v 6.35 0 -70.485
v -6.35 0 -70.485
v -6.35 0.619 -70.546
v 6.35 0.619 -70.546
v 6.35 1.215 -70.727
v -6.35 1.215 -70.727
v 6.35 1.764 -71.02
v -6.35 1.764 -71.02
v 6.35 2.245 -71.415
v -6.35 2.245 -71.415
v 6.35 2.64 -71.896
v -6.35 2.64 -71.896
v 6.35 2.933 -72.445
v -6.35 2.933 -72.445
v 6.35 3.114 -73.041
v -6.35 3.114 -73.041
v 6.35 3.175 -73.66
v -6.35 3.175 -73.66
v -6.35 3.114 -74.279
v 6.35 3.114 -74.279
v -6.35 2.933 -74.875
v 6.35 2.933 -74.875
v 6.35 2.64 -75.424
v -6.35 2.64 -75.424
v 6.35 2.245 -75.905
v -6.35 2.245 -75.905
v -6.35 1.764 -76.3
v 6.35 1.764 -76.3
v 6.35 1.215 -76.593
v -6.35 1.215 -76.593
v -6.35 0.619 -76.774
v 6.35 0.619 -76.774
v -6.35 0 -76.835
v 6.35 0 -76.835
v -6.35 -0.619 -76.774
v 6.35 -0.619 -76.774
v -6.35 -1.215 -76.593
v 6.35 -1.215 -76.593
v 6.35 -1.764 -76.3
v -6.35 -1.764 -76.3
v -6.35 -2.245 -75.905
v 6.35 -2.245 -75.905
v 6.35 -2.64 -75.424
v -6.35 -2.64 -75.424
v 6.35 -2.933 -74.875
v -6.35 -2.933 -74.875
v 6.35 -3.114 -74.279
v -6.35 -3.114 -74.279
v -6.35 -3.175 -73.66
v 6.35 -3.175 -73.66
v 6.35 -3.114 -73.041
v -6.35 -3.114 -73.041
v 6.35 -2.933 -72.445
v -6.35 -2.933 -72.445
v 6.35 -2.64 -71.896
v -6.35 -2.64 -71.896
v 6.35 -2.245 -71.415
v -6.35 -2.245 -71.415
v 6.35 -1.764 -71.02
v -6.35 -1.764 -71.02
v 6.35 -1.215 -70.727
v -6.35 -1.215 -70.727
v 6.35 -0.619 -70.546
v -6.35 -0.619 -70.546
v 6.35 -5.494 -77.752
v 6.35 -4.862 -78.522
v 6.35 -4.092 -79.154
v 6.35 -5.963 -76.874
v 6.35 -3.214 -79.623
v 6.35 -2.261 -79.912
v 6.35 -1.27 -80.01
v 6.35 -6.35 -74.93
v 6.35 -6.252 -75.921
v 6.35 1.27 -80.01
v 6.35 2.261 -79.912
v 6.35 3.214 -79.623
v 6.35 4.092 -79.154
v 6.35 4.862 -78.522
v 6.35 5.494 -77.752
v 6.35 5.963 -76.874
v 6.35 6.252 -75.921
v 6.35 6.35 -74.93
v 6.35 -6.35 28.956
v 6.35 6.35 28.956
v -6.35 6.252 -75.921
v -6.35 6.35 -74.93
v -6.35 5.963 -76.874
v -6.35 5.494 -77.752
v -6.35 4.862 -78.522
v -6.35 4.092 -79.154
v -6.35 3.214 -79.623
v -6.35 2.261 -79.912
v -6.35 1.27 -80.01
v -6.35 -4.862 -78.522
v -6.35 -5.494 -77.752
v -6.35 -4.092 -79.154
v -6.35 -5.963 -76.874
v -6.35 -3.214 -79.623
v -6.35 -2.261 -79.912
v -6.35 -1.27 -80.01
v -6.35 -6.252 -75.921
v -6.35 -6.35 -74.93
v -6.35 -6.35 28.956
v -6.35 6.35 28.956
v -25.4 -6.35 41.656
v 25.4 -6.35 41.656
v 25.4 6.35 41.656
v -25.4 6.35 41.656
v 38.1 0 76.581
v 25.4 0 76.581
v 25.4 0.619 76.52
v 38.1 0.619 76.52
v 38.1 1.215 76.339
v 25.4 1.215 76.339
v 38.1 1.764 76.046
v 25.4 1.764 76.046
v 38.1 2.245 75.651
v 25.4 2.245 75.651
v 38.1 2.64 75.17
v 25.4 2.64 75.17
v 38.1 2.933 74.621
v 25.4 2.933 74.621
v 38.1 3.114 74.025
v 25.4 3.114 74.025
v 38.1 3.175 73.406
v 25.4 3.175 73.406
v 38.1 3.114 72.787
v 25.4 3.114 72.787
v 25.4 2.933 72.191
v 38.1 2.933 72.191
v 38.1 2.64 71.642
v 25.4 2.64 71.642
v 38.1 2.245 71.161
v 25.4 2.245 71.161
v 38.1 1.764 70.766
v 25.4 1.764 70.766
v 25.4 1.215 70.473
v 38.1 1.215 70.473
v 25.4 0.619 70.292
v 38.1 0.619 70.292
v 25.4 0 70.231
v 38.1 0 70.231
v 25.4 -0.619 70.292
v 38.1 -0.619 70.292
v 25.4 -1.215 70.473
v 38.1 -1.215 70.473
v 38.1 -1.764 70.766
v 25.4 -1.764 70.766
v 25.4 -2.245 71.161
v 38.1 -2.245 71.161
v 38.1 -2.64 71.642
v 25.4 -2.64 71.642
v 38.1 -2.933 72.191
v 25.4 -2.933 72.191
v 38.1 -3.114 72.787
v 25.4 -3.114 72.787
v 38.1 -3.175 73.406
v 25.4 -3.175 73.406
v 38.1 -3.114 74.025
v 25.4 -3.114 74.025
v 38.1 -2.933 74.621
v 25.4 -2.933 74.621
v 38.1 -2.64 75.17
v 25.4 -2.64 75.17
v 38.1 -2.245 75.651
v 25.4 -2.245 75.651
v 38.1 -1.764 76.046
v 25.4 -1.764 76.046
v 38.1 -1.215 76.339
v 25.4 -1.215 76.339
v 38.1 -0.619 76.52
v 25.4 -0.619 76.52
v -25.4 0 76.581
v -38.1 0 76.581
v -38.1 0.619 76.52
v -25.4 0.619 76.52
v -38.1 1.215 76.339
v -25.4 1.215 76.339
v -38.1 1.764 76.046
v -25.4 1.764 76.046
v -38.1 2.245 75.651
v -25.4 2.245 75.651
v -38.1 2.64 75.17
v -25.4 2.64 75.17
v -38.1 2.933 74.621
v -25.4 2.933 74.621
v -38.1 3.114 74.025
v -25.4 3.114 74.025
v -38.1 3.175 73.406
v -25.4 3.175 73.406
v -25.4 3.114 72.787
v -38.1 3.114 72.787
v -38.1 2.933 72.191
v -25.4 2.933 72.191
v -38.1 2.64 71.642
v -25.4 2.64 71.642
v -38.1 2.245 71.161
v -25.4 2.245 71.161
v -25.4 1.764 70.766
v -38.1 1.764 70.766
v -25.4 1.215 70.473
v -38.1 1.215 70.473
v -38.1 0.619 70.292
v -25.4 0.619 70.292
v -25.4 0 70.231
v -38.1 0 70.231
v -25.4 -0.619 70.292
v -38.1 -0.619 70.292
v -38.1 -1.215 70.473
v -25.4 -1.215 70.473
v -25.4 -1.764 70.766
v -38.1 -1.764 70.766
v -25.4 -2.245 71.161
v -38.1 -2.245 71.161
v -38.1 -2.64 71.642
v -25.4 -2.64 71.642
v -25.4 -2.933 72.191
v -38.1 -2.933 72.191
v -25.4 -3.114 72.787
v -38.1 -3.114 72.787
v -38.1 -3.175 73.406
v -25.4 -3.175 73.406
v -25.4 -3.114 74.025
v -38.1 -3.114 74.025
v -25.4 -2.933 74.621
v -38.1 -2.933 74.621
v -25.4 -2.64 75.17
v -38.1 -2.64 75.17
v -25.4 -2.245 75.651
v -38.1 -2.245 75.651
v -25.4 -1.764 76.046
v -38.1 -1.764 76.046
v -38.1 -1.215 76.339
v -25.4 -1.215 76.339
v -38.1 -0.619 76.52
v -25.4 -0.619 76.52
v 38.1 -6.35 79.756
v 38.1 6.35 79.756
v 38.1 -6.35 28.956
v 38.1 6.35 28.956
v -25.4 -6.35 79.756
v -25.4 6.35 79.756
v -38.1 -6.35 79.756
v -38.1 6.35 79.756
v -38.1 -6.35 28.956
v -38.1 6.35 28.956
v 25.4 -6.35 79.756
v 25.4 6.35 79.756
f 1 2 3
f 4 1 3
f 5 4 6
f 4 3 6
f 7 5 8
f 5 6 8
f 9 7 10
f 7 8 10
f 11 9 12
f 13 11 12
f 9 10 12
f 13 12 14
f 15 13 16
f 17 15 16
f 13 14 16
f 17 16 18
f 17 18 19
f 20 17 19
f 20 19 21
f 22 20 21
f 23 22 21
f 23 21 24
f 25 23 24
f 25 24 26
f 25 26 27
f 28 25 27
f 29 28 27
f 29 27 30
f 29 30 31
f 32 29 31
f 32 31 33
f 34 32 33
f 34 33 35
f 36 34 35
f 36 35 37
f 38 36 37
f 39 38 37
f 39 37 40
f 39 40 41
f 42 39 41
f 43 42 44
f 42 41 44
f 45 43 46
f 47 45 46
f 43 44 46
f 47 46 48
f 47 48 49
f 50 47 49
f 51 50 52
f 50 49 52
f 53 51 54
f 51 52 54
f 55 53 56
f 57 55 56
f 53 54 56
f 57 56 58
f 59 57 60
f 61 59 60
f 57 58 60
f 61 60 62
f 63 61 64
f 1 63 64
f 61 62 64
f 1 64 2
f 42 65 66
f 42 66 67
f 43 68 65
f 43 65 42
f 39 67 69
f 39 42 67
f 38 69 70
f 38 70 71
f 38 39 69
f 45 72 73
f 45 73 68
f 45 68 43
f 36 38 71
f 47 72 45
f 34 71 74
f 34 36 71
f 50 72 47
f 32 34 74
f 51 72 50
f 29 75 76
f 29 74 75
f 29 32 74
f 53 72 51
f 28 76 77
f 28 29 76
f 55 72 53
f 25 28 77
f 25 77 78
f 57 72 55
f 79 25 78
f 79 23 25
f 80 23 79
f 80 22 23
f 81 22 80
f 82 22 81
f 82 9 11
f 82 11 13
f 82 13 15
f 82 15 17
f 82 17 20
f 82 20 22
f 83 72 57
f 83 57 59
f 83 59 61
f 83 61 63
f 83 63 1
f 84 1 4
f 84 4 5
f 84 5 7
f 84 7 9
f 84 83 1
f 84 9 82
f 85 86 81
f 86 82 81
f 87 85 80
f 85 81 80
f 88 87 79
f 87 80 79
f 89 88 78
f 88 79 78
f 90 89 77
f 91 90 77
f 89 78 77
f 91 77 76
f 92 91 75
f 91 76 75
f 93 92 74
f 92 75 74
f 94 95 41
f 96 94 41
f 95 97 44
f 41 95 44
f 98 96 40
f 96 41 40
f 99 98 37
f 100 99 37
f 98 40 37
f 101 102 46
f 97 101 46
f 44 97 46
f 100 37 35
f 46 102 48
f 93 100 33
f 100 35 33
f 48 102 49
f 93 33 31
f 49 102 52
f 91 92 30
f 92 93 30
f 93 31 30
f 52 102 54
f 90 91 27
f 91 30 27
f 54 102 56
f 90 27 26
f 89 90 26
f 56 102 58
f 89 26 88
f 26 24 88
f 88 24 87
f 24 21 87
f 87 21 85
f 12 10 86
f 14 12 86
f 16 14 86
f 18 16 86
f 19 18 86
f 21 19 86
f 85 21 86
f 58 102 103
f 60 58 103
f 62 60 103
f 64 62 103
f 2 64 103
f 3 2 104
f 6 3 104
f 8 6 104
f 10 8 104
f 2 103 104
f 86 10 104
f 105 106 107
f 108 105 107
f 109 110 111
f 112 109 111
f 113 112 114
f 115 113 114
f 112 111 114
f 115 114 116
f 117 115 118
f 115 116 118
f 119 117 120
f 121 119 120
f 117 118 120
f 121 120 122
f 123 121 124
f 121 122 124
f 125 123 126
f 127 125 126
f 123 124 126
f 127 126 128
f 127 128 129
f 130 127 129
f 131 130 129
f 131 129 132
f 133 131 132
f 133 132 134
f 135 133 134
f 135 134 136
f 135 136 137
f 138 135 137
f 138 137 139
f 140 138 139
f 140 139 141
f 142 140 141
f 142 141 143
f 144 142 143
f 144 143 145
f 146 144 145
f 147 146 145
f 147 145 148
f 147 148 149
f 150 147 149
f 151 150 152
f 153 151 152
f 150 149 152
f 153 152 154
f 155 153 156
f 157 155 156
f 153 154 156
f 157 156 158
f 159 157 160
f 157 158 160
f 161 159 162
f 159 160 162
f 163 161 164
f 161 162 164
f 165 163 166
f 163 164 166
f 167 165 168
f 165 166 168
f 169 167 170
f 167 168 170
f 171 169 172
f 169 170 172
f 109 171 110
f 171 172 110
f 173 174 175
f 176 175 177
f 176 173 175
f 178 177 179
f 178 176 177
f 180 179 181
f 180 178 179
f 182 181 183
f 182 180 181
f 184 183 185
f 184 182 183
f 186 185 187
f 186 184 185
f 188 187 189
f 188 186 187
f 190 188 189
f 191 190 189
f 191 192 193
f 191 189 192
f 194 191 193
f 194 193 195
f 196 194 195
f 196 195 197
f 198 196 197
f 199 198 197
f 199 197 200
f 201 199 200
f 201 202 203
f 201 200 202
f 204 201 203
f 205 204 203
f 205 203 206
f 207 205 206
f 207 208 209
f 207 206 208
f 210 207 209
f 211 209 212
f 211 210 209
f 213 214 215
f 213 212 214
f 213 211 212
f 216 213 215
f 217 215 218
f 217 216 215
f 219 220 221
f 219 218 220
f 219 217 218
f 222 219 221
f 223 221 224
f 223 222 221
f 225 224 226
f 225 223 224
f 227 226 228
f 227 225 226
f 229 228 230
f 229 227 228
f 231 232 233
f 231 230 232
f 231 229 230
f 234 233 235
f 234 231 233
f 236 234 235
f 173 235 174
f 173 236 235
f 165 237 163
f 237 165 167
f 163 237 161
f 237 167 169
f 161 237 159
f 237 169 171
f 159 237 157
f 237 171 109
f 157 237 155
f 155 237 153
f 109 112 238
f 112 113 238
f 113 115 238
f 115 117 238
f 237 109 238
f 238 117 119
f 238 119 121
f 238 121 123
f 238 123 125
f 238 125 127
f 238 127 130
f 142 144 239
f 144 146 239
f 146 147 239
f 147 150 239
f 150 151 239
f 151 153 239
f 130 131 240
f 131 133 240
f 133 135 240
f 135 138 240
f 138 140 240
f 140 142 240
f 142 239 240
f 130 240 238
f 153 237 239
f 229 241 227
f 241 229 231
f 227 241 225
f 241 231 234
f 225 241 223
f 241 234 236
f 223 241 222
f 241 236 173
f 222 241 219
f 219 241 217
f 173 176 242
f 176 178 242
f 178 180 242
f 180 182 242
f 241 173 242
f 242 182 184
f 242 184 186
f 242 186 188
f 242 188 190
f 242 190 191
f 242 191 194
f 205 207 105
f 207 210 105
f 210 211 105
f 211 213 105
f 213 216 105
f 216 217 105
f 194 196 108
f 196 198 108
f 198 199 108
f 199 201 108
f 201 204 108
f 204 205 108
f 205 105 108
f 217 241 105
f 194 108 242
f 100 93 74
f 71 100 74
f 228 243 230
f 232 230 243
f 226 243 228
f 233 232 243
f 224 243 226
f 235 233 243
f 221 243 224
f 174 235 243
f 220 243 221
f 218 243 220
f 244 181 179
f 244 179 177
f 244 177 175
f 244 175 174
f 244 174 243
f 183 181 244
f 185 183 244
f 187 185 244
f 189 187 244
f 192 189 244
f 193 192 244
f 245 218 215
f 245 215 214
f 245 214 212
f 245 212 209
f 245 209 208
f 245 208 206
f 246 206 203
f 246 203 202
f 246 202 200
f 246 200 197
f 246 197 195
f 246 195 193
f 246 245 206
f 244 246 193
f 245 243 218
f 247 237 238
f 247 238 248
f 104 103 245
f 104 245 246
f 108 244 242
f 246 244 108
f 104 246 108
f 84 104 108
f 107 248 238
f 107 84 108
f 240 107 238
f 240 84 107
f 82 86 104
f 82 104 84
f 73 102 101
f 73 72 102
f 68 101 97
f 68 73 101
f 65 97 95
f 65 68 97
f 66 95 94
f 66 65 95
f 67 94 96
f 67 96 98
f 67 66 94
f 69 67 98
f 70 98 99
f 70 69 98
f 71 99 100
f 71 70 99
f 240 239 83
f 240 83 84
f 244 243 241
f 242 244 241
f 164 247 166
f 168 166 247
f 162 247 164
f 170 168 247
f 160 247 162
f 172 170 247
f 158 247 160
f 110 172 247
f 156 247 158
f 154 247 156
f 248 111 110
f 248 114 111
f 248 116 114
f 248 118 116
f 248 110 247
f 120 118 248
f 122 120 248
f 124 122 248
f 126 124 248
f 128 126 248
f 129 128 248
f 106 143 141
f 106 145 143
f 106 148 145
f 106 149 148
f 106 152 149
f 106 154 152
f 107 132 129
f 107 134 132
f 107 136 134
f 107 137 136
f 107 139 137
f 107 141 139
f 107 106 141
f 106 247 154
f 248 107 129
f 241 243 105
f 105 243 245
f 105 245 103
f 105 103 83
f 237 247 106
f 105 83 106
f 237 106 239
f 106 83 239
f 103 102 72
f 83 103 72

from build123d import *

# Parameters (mm, degrees)
SKETCH1_W                = 12.7
SKETCH1_H                = 12.7
BOSS_EXTRUDE1_DEPTH      = 41.656
BOSS_EXTRUDE1_DEPTH_BACK = 80.01
SKETCH4_W                = 12.7
SKETCH4_H                = 12.7
BOSS_EXTRUDE2_DEPTH      = 38.1
SKETCH5_W                = 12.7
SKETCH5_H                = 12.7
BOSS_EXTRUDE3_DEPTH      = 50.8
SKETCH6_R                = 3.175
CUT_EXTRUDE1_DEPTH       = 16.51
SKETCH7_R                = 3.175
CUT_EXTRUDE2_DEPTH       = 45.45
FILLET1_R                = 5.08


with BuildPart() as part:
    # Sketch1 → Boss-Extrude1 (new body, two sides)
    with BuildSketch(Plane.XY) as boss_extrude1_sk:
        Rectangle(SKETCH1_W, SKETCH1_H)
    extrude(amount=BOSS_EXTRUDE1_DEPTH)
    extrude(boss_extrude1_sk.sketch, amount=-BOSS_EXTRUDE1_DEPTH_BACK)

    # Sketch4 → Boss-Extrude2 (add, symmetric)
    with BuildSketch(Plane(origin=(0, 0, 0), x_dir=(0, 0, -1), z_dir=(1, 0, 0))):
        with Locations((-35.306, 0)):
            Rectangle(SKETCH4_W, SKETCH4_H)
    extrude(amount=BOSS_EXTRUDE2_DEPTH, both=True)

    # Sketch5 → Boss-Extrude3 (add)
    with BuildSketch(Plane(origin=(0, 0, 28.956), x_dir=(-1, 0, 0), z_dir=(0, 0, -1))):
        with Locations((-31.75, 0)):
            Rectangle(SKETCH5_W, SKETCH5_H)
    boss_extrude3 = extrude(amount=-BOSS_EXTRUDE3_DEPTH)

    # Sketch6 → Cut-Extrude1 (cut)
    with BuildSketch(Plane.ZY.offset(-25.4)):
        with Locations((73.406, 0)):
            Circle(SKETCH6_R)
    cut_extrude1 = extrude(amount=-CUT_EXTRUDE1_DEPTH, mode=Mode.SUBTRACT)

    # Mirror1: Boss-Extrude3, Cut-Extrude1 across plane
    add(boss_extrude3.mirror(Plane(origin=(0, 0, 0), x_dir=(0, 0, 1), z_dir=(1, 0, 0))))
    add(cut_extrude1.mirror(Plane(origin=(0, 0, 0), x_dir=(0, 0, 1), z_dir=(1, 0, 0))), mode=Mode.SUBTRACT)

    # Sketch7 → Cut-Extrude2 (cut, through all)
    with BuildSketch(Plane.ZY.offset(6.35)):
        with Locations((-73.66, 0)):
            Circle(SKETCH7_R)
    extrude(amount=-CUT_EXTRUDE2_DEPTH, mode=Mode.SUBTRACT)

    # Fillet1
    fillet1_edges = [part.edges().sort_by_distance(p)[0] for p in [
        (0, 6.35, -80.01),
        (0, -6.35, -80.01),
    ]]
    fillet(fillet1_edges, radius=FILLET1_R)


solid = part.part
